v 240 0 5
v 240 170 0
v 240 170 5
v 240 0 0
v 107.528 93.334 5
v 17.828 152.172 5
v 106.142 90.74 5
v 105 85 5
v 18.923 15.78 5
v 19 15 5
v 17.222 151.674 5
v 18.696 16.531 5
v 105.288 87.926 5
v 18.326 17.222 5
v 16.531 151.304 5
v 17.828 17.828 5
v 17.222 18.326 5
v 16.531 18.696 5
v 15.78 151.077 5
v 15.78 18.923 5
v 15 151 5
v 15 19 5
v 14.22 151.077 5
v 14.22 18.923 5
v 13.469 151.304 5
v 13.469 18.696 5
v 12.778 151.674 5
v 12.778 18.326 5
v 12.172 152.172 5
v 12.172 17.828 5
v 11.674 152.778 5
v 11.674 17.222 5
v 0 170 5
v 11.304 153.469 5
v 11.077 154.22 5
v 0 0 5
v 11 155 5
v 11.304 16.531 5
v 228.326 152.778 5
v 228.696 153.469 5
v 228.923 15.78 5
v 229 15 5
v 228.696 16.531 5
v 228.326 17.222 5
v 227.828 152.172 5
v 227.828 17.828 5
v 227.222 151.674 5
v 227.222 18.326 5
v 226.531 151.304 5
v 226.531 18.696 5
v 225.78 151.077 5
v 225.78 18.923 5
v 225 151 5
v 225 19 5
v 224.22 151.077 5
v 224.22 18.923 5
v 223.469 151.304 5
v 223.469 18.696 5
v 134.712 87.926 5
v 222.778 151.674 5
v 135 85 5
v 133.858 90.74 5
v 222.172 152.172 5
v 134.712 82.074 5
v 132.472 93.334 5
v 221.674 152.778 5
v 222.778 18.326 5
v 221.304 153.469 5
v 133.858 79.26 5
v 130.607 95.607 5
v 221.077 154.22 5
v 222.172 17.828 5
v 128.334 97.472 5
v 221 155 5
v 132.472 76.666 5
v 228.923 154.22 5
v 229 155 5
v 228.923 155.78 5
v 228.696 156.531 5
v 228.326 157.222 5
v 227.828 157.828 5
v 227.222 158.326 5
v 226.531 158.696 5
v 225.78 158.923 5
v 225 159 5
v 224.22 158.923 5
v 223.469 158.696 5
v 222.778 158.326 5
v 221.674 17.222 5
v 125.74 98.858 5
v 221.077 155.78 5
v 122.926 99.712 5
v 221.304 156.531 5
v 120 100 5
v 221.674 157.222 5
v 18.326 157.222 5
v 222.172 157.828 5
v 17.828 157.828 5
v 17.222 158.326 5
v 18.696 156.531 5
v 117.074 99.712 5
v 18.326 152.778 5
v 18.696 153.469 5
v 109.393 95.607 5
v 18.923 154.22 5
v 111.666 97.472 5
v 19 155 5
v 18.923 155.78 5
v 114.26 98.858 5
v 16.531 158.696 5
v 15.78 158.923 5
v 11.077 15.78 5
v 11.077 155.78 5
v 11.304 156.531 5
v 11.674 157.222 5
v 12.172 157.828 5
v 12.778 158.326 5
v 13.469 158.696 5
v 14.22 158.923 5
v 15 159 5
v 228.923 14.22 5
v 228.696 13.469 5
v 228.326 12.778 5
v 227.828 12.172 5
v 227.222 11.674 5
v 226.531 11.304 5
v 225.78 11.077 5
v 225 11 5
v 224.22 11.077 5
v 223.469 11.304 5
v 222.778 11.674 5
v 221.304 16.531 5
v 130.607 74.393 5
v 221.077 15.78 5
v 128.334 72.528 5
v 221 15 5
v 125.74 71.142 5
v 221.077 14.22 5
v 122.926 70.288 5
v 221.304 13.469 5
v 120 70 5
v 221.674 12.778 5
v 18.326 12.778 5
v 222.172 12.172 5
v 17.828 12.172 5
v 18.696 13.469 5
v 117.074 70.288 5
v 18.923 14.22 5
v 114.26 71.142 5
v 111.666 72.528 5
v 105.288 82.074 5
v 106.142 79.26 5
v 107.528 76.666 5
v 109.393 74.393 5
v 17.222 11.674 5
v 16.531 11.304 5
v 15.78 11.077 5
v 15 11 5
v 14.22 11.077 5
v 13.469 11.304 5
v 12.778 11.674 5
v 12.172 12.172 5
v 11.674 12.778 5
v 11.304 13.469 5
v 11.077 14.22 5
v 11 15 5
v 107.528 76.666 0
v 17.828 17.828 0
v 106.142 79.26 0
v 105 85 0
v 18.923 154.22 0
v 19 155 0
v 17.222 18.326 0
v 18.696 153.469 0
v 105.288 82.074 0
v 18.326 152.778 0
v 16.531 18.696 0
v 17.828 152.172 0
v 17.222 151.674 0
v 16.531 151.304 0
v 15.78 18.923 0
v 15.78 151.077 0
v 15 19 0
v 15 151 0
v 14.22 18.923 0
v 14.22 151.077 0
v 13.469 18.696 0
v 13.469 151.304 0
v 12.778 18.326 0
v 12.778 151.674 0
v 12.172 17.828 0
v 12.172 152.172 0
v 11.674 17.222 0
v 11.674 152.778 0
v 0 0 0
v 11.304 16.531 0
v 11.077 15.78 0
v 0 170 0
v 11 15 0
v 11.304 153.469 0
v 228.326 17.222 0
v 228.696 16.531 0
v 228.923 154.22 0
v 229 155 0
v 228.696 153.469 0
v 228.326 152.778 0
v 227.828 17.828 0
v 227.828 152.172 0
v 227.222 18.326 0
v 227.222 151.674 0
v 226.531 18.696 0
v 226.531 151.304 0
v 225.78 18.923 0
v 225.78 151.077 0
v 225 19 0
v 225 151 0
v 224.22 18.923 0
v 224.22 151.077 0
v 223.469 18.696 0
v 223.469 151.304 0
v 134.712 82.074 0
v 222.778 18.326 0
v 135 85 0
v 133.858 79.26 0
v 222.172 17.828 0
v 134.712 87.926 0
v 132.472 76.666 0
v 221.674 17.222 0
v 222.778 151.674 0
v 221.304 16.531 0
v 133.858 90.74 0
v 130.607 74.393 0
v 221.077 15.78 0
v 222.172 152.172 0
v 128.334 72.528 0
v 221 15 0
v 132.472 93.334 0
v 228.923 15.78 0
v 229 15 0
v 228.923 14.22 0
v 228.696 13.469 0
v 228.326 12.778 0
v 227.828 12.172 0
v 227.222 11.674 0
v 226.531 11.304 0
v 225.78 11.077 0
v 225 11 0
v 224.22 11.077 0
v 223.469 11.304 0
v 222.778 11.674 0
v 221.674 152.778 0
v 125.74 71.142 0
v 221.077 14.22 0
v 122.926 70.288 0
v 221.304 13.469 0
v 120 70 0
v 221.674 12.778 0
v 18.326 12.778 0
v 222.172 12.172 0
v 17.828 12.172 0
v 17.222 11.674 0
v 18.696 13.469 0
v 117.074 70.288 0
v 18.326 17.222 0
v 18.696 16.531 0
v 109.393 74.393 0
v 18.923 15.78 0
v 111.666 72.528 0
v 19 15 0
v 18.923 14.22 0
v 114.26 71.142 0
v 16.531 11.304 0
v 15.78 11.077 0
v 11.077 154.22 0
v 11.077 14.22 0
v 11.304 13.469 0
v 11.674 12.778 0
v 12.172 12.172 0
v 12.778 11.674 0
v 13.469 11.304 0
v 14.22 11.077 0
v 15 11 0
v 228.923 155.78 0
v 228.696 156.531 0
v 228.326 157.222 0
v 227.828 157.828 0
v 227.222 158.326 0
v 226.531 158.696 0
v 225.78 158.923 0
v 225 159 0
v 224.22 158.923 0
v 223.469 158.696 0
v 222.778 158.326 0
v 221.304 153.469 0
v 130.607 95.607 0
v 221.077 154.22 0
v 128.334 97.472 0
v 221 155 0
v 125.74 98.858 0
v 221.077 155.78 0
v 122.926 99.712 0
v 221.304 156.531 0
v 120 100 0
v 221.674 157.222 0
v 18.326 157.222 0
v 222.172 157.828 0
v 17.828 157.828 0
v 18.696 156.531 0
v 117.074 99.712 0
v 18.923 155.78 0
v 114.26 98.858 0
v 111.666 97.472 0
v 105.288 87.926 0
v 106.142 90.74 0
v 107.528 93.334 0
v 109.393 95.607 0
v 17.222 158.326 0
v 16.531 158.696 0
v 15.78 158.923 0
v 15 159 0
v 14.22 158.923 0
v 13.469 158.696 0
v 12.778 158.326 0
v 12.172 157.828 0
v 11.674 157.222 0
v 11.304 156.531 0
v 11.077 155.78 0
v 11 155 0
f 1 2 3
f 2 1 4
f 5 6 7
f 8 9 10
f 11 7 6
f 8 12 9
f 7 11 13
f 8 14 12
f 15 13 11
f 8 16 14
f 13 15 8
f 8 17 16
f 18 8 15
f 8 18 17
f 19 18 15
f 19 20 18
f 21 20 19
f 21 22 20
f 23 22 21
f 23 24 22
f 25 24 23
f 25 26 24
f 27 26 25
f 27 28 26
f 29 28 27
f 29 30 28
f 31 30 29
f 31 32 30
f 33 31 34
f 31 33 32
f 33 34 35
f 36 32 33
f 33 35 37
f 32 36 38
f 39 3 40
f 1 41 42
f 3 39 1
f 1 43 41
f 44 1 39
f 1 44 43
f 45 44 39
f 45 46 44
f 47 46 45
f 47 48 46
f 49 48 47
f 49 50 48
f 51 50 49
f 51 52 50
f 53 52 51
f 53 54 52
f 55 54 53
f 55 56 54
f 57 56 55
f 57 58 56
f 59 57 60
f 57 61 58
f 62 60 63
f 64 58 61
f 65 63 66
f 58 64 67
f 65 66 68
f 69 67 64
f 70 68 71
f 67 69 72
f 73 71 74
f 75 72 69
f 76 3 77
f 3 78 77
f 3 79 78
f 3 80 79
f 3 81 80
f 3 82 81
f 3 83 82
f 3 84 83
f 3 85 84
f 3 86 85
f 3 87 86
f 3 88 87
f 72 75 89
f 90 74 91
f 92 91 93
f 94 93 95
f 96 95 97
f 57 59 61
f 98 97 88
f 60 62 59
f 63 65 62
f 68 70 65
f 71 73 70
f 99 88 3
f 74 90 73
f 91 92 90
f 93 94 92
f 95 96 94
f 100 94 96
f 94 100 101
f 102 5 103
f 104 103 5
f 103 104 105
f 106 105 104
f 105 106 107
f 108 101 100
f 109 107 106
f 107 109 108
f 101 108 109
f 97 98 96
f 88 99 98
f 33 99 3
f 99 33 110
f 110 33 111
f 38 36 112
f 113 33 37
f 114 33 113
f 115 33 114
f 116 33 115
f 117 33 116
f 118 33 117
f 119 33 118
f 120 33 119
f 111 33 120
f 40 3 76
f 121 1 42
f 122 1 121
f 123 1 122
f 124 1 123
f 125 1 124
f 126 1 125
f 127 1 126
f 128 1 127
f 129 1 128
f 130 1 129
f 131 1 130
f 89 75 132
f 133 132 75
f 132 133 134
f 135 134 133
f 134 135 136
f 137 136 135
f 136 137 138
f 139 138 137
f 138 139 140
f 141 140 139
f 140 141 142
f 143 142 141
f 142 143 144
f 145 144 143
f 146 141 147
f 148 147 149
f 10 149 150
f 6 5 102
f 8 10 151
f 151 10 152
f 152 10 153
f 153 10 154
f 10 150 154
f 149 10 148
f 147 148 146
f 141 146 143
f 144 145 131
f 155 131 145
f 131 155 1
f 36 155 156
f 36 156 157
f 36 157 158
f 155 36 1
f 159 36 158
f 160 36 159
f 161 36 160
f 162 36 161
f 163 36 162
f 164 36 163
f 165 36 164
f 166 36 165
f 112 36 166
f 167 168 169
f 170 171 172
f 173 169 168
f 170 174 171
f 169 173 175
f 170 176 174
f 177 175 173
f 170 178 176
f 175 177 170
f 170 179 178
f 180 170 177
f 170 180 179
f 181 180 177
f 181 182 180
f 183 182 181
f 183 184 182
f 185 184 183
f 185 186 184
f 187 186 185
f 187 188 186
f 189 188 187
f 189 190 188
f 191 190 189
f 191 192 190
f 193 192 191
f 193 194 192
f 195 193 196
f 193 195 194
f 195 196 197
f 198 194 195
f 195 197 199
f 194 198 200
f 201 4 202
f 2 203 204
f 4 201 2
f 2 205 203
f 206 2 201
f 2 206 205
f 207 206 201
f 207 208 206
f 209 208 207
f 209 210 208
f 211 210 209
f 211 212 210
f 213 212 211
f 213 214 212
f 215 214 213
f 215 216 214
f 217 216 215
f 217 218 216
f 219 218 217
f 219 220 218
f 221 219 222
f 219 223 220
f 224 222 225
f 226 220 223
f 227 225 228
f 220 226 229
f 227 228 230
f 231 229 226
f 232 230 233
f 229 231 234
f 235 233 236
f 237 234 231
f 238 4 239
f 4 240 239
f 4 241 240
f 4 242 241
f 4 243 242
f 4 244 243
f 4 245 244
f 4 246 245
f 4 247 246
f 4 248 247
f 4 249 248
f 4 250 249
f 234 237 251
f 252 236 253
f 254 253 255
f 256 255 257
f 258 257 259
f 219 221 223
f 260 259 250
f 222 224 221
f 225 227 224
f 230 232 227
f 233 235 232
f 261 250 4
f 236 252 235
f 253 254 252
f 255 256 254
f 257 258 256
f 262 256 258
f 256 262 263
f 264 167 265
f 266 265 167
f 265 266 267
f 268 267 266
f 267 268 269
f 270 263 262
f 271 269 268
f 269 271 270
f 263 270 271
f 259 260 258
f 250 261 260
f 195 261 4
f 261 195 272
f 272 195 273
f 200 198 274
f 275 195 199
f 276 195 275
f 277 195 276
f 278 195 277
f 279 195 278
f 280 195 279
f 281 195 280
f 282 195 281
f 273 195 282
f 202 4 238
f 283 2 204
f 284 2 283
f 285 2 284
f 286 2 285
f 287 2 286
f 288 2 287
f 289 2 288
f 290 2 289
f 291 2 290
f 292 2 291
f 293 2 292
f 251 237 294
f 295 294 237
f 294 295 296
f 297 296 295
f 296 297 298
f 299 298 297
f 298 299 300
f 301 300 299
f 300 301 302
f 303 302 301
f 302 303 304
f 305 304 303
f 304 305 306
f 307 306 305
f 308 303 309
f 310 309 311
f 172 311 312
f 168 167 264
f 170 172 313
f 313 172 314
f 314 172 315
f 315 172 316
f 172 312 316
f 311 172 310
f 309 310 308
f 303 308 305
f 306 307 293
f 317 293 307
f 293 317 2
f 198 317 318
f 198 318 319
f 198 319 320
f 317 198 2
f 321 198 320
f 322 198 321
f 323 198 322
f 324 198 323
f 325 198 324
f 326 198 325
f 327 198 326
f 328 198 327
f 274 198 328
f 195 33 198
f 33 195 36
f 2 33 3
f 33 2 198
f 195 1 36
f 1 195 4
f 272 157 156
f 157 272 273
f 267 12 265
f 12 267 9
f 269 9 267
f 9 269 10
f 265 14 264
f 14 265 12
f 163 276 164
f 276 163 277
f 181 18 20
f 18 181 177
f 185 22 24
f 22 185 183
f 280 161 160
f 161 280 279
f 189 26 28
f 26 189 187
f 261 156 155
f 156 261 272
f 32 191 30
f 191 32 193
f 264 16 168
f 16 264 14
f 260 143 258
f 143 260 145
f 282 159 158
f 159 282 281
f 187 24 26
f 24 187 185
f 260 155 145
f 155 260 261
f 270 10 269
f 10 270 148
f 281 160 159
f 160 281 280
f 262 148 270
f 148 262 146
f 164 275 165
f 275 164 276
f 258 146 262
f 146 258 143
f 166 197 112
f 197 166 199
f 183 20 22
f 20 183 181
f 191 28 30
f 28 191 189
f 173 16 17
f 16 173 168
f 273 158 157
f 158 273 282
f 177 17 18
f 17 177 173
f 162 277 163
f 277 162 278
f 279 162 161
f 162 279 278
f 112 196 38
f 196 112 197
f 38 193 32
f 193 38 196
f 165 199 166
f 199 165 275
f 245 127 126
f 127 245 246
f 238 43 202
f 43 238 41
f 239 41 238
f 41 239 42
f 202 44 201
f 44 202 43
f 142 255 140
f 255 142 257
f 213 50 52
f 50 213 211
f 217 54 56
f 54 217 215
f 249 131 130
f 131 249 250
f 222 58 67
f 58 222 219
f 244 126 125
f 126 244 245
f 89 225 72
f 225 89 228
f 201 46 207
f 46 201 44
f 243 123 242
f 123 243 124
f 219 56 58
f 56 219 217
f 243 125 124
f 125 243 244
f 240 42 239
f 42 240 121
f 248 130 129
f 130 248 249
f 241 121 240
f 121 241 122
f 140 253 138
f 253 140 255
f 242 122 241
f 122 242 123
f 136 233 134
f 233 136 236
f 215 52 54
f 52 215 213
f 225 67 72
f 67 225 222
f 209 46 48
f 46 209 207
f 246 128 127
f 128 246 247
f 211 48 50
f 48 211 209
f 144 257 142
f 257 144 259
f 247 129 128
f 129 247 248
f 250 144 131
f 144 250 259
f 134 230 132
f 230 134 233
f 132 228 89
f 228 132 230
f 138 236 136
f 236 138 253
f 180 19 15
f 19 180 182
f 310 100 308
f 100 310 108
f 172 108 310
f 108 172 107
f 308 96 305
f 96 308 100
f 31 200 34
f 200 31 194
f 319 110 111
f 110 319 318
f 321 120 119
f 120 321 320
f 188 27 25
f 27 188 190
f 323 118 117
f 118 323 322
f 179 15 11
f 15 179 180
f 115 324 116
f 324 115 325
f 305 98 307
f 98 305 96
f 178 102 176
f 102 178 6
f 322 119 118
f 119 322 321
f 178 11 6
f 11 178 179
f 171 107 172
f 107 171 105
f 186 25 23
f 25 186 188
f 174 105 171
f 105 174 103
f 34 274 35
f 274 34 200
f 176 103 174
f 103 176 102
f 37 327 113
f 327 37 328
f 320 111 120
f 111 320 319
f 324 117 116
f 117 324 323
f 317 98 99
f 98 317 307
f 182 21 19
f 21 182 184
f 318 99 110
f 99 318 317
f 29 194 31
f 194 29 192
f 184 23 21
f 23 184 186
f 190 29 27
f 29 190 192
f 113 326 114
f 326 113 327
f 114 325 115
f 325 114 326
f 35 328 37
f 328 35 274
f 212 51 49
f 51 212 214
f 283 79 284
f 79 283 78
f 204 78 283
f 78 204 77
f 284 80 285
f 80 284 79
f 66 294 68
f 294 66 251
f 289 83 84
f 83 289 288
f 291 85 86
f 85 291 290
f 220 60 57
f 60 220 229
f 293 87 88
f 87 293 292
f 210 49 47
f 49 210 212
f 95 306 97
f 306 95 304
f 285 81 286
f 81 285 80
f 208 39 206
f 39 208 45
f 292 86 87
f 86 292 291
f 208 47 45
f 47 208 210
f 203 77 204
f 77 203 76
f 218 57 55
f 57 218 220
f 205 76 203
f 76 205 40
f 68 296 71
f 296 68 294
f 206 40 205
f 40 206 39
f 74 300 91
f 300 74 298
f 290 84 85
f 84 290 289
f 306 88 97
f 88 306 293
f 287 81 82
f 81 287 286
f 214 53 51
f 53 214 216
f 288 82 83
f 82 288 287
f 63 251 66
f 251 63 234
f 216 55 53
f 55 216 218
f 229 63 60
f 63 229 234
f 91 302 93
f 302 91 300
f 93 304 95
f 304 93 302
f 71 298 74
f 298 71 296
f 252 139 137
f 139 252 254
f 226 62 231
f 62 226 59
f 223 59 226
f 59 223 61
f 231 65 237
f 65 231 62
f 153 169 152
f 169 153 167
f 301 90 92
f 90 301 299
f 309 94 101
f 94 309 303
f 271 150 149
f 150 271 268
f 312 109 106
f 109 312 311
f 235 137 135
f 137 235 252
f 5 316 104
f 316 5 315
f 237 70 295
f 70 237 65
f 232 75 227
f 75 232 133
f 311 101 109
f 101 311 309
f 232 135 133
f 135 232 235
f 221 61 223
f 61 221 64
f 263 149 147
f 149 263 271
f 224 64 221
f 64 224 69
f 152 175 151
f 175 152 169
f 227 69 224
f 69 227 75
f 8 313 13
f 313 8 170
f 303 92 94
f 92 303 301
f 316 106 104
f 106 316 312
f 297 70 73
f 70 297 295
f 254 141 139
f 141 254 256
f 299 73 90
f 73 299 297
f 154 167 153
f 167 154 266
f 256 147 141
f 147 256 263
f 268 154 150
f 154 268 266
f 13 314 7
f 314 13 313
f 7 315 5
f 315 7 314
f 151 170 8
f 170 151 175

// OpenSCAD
$fn = 32;
// target_bbox: 240, 170, 5
// ----------------------------------------------------------------------
// Big plate: 200-250 mm adapter plate
// ----------------------------------------------------------------------

// --- parameters (mm) ---
plate_l = 240;            // plate length, X
plate_w = 170;            // plate width, Y
plate_t = 5;              // plate thickness, Z
corner_d = 8;             // corner hole diameter
corner_in = 15;           // corner hole inset from the edges
bore_d = 30;              // central bore
fit_tol = 0.1;            // tolerance for press fits, mm
free_tol = 0.3;           // tolerance for clearance fits, mm

difference() {
  cube([plate_l, plate_w, plate_t]);
  translate([corner_in, corner_in, -1]) cylinder(h = plate_t + 2, d = corner_d);
  translate([plate_l - corner_in, corner_in, -1]) cylinder(h = plate_t + 2, d = corner_d);
  translate([corner_in, plate_w - corner_in, -1]) cylinder(h = plate_t + 2, d = corner_d);
  translate([plate_l - corner_in, plate_w - corner_in, -1]) cylinder(h = plate_t + 2, d = corner_d);
  translate([plate_l / 2, plate_w / 2, -1]) cylinder(h = plate_t + 2, d = bore_d);
}
